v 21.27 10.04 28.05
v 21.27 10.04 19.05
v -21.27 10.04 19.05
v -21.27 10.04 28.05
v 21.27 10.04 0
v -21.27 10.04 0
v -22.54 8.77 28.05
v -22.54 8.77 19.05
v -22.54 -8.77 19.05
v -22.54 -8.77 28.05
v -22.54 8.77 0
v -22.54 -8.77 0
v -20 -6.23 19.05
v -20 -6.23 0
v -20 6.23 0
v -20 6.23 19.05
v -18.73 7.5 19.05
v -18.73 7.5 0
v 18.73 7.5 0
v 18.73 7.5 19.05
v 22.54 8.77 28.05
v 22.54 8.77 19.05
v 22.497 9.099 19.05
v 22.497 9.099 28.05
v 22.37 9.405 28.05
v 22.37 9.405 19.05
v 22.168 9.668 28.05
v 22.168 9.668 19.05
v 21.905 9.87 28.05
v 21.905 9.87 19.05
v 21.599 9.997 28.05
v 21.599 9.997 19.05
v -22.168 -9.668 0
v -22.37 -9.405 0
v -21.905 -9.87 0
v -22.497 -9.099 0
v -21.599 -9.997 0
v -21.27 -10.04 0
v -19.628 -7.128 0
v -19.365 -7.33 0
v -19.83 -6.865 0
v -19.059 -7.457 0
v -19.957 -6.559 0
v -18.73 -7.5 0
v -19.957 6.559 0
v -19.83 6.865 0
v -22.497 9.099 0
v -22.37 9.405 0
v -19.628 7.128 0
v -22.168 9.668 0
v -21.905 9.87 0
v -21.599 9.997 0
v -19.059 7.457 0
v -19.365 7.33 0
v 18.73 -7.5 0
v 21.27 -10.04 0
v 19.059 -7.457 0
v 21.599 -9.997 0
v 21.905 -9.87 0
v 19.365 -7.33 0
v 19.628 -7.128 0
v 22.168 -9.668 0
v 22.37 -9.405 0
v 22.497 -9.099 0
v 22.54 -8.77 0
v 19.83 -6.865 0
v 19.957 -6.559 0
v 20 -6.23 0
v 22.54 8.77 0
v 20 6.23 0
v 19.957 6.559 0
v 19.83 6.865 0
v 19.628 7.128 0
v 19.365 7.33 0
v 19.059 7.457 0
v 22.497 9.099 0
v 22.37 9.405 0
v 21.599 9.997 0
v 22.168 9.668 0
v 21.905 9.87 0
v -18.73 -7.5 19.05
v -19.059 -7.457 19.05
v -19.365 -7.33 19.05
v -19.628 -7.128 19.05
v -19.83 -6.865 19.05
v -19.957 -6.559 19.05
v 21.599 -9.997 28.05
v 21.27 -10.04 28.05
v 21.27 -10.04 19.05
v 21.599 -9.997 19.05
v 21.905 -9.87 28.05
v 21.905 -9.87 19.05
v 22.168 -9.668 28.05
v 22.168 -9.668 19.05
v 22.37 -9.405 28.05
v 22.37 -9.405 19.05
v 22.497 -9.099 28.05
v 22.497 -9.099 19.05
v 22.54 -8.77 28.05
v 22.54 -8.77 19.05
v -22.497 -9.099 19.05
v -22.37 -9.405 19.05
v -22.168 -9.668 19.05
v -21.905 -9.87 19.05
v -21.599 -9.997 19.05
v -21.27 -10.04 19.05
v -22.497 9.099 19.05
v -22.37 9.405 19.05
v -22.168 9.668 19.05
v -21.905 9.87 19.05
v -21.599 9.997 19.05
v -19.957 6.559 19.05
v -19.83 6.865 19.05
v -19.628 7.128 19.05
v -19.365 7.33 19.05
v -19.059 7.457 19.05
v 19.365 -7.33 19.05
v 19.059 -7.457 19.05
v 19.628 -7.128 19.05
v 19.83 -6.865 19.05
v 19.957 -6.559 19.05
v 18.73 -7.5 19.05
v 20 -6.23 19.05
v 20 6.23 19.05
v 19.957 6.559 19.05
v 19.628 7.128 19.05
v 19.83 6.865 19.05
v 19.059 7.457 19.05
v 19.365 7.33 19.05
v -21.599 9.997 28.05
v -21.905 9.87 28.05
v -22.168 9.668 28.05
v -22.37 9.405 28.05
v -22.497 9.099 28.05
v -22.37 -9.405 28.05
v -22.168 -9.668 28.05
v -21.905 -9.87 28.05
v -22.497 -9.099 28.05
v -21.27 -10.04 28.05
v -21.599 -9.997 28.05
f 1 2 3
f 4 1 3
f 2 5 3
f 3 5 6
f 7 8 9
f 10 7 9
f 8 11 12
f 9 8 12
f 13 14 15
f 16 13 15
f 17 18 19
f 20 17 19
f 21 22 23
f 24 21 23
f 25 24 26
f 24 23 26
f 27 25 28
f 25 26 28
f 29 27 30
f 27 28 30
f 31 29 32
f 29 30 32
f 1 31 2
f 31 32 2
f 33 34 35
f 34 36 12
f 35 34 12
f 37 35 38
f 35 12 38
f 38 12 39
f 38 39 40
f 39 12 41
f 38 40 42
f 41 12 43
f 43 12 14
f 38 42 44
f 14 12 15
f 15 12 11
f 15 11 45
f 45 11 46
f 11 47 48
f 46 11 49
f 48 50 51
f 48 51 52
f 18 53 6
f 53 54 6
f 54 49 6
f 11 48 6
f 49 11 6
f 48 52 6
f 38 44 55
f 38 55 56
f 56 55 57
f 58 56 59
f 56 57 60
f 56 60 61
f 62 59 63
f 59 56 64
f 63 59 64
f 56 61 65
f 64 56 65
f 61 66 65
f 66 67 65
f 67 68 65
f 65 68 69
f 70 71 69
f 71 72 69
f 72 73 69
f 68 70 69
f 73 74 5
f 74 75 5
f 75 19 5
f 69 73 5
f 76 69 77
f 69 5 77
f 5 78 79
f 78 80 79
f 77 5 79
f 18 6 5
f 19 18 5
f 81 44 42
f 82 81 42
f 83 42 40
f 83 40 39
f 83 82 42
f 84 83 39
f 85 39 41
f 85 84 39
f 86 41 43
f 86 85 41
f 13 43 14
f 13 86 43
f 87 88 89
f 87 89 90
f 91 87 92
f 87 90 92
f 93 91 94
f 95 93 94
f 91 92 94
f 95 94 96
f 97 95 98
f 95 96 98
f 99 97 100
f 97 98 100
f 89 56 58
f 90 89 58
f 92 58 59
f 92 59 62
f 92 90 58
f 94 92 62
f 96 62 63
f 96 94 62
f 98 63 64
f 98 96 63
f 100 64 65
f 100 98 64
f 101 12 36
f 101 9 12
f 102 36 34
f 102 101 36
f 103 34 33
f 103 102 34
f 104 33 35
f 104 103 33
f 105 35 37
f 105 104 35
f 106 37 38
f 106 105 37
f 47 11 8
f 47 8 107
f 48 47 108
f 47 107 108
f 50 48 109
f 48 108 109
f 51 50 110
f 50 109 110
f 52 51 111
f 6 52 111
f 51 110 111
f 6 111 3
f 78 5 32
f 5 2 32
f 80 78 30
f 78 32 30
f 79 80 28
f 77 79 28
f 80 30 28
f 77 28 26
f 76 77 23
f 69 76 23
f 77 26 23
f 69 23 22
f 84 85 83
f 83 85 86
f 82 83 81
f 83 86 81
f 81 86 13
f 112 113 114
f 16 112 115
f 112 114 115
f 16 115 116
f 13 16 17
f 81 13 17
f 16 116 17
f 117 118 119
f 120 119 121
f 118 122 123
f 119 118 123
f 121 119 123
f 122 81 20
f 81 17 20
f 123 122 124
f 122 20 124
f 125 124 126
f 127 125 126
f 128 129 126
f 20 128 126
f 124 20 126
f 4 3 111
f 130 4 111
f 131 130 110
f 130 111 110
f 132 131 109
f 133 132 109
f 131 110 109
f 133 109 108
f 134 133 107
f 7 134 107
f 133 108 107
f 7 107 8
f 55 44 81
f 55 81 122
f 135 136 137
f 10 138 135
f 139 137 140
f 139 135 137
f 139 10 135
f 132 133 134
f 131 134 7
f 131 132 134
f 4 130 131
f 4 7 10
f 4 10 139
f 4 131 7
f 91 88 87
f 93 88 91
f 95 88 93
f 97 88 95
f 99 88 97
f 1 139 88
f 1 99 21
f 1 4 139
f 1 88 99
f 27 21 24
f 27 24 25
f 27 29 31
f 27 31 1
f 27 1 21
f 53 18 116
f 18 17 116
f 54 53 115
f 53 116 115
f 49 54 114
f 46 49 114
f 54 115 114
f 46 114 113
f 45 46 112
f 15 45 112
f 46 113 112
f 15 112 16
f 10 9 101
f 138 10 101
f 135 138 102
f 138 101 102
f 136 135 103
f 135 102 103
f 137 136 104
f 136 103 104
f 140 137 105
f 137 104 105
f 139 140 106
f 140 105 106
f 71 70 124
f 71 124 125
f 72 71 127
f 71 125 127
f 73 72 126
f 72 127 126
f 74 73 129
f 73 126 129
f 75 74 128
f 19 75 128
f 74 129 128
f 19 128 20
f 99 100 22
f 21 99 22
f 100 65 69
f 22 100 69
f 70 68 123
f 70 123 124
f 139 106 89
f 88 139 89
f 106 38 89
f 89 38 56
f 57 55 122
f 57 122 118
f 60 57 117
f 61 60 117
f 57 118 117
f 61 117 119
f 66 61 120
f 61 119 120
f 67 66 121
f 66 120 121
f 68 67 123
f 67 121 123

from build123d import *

# Parameters (mm, degrees)
F0_W     = 45.08
F0_H     = 20.08
F0_W_2   = 40
F0_H_2   = 15
F1_DEPTH = 19.05
F2_R     = 1.27
F4_DEPTH = 9


with BuildPart() as f1:
    # F0 (on Top) → F1 (new body)
    with BuildSketch(Plane.XY):
        Rectangle(F0_W, F0_H)
        Rectangle(F0_W_2, F0_H_2, mode=Mode.SUBTRACT)
    extrude(amount=F1_DEPTH)

    # F2
    f2_edges = [f1.edges().sort_by_distance(p)[0] for p in [
        (-20, 7.5, 9.525),
        (-20, -7.5, 9.525),
        (20, 7.5, 9.525),
        (20, -7.5, 9.525),
        (-22.54, -10.04, 9.525),
        (-22.54, 10.04, 9.525),
        (22.54, -10.04, 9.525),
        (22.54, 10.04, 9.525),
    ]]
    fillet(f2_edges, radius=F2_R)

    # F3 (on face) → F4 (join)
    with BuildSketch(Plane.XY.offset(19.05)):
        with BuildLine():
            Line((21.27, 10.04), (-21.27, 10.04))
            ThreePointArc((-21.27, 10.04), (-22.168026, 9.668026), (-22.54, 8.77))
            Line((-22.54, 8.77), (-22.54, -8.77))
            ThreePointArc((-22.54, -8.77), (-22.168026, -9.668026), (-21.27, -10.04))
            Line((-21.27, -10.04), (21.27, -10.04))
            ThreePointArc((21.27, -10.04), (22.168026, -9.668026), (22.54, -8.77))
            Line((22.54, -8.77), (22.54, 8.77))
            ThreePointArc((22.54, 8.77), (22.168026, 9.668026), (21.27, 10.04))
        make_face()
    extrude(amount=F4_DEPTH)


solid = f1.part
